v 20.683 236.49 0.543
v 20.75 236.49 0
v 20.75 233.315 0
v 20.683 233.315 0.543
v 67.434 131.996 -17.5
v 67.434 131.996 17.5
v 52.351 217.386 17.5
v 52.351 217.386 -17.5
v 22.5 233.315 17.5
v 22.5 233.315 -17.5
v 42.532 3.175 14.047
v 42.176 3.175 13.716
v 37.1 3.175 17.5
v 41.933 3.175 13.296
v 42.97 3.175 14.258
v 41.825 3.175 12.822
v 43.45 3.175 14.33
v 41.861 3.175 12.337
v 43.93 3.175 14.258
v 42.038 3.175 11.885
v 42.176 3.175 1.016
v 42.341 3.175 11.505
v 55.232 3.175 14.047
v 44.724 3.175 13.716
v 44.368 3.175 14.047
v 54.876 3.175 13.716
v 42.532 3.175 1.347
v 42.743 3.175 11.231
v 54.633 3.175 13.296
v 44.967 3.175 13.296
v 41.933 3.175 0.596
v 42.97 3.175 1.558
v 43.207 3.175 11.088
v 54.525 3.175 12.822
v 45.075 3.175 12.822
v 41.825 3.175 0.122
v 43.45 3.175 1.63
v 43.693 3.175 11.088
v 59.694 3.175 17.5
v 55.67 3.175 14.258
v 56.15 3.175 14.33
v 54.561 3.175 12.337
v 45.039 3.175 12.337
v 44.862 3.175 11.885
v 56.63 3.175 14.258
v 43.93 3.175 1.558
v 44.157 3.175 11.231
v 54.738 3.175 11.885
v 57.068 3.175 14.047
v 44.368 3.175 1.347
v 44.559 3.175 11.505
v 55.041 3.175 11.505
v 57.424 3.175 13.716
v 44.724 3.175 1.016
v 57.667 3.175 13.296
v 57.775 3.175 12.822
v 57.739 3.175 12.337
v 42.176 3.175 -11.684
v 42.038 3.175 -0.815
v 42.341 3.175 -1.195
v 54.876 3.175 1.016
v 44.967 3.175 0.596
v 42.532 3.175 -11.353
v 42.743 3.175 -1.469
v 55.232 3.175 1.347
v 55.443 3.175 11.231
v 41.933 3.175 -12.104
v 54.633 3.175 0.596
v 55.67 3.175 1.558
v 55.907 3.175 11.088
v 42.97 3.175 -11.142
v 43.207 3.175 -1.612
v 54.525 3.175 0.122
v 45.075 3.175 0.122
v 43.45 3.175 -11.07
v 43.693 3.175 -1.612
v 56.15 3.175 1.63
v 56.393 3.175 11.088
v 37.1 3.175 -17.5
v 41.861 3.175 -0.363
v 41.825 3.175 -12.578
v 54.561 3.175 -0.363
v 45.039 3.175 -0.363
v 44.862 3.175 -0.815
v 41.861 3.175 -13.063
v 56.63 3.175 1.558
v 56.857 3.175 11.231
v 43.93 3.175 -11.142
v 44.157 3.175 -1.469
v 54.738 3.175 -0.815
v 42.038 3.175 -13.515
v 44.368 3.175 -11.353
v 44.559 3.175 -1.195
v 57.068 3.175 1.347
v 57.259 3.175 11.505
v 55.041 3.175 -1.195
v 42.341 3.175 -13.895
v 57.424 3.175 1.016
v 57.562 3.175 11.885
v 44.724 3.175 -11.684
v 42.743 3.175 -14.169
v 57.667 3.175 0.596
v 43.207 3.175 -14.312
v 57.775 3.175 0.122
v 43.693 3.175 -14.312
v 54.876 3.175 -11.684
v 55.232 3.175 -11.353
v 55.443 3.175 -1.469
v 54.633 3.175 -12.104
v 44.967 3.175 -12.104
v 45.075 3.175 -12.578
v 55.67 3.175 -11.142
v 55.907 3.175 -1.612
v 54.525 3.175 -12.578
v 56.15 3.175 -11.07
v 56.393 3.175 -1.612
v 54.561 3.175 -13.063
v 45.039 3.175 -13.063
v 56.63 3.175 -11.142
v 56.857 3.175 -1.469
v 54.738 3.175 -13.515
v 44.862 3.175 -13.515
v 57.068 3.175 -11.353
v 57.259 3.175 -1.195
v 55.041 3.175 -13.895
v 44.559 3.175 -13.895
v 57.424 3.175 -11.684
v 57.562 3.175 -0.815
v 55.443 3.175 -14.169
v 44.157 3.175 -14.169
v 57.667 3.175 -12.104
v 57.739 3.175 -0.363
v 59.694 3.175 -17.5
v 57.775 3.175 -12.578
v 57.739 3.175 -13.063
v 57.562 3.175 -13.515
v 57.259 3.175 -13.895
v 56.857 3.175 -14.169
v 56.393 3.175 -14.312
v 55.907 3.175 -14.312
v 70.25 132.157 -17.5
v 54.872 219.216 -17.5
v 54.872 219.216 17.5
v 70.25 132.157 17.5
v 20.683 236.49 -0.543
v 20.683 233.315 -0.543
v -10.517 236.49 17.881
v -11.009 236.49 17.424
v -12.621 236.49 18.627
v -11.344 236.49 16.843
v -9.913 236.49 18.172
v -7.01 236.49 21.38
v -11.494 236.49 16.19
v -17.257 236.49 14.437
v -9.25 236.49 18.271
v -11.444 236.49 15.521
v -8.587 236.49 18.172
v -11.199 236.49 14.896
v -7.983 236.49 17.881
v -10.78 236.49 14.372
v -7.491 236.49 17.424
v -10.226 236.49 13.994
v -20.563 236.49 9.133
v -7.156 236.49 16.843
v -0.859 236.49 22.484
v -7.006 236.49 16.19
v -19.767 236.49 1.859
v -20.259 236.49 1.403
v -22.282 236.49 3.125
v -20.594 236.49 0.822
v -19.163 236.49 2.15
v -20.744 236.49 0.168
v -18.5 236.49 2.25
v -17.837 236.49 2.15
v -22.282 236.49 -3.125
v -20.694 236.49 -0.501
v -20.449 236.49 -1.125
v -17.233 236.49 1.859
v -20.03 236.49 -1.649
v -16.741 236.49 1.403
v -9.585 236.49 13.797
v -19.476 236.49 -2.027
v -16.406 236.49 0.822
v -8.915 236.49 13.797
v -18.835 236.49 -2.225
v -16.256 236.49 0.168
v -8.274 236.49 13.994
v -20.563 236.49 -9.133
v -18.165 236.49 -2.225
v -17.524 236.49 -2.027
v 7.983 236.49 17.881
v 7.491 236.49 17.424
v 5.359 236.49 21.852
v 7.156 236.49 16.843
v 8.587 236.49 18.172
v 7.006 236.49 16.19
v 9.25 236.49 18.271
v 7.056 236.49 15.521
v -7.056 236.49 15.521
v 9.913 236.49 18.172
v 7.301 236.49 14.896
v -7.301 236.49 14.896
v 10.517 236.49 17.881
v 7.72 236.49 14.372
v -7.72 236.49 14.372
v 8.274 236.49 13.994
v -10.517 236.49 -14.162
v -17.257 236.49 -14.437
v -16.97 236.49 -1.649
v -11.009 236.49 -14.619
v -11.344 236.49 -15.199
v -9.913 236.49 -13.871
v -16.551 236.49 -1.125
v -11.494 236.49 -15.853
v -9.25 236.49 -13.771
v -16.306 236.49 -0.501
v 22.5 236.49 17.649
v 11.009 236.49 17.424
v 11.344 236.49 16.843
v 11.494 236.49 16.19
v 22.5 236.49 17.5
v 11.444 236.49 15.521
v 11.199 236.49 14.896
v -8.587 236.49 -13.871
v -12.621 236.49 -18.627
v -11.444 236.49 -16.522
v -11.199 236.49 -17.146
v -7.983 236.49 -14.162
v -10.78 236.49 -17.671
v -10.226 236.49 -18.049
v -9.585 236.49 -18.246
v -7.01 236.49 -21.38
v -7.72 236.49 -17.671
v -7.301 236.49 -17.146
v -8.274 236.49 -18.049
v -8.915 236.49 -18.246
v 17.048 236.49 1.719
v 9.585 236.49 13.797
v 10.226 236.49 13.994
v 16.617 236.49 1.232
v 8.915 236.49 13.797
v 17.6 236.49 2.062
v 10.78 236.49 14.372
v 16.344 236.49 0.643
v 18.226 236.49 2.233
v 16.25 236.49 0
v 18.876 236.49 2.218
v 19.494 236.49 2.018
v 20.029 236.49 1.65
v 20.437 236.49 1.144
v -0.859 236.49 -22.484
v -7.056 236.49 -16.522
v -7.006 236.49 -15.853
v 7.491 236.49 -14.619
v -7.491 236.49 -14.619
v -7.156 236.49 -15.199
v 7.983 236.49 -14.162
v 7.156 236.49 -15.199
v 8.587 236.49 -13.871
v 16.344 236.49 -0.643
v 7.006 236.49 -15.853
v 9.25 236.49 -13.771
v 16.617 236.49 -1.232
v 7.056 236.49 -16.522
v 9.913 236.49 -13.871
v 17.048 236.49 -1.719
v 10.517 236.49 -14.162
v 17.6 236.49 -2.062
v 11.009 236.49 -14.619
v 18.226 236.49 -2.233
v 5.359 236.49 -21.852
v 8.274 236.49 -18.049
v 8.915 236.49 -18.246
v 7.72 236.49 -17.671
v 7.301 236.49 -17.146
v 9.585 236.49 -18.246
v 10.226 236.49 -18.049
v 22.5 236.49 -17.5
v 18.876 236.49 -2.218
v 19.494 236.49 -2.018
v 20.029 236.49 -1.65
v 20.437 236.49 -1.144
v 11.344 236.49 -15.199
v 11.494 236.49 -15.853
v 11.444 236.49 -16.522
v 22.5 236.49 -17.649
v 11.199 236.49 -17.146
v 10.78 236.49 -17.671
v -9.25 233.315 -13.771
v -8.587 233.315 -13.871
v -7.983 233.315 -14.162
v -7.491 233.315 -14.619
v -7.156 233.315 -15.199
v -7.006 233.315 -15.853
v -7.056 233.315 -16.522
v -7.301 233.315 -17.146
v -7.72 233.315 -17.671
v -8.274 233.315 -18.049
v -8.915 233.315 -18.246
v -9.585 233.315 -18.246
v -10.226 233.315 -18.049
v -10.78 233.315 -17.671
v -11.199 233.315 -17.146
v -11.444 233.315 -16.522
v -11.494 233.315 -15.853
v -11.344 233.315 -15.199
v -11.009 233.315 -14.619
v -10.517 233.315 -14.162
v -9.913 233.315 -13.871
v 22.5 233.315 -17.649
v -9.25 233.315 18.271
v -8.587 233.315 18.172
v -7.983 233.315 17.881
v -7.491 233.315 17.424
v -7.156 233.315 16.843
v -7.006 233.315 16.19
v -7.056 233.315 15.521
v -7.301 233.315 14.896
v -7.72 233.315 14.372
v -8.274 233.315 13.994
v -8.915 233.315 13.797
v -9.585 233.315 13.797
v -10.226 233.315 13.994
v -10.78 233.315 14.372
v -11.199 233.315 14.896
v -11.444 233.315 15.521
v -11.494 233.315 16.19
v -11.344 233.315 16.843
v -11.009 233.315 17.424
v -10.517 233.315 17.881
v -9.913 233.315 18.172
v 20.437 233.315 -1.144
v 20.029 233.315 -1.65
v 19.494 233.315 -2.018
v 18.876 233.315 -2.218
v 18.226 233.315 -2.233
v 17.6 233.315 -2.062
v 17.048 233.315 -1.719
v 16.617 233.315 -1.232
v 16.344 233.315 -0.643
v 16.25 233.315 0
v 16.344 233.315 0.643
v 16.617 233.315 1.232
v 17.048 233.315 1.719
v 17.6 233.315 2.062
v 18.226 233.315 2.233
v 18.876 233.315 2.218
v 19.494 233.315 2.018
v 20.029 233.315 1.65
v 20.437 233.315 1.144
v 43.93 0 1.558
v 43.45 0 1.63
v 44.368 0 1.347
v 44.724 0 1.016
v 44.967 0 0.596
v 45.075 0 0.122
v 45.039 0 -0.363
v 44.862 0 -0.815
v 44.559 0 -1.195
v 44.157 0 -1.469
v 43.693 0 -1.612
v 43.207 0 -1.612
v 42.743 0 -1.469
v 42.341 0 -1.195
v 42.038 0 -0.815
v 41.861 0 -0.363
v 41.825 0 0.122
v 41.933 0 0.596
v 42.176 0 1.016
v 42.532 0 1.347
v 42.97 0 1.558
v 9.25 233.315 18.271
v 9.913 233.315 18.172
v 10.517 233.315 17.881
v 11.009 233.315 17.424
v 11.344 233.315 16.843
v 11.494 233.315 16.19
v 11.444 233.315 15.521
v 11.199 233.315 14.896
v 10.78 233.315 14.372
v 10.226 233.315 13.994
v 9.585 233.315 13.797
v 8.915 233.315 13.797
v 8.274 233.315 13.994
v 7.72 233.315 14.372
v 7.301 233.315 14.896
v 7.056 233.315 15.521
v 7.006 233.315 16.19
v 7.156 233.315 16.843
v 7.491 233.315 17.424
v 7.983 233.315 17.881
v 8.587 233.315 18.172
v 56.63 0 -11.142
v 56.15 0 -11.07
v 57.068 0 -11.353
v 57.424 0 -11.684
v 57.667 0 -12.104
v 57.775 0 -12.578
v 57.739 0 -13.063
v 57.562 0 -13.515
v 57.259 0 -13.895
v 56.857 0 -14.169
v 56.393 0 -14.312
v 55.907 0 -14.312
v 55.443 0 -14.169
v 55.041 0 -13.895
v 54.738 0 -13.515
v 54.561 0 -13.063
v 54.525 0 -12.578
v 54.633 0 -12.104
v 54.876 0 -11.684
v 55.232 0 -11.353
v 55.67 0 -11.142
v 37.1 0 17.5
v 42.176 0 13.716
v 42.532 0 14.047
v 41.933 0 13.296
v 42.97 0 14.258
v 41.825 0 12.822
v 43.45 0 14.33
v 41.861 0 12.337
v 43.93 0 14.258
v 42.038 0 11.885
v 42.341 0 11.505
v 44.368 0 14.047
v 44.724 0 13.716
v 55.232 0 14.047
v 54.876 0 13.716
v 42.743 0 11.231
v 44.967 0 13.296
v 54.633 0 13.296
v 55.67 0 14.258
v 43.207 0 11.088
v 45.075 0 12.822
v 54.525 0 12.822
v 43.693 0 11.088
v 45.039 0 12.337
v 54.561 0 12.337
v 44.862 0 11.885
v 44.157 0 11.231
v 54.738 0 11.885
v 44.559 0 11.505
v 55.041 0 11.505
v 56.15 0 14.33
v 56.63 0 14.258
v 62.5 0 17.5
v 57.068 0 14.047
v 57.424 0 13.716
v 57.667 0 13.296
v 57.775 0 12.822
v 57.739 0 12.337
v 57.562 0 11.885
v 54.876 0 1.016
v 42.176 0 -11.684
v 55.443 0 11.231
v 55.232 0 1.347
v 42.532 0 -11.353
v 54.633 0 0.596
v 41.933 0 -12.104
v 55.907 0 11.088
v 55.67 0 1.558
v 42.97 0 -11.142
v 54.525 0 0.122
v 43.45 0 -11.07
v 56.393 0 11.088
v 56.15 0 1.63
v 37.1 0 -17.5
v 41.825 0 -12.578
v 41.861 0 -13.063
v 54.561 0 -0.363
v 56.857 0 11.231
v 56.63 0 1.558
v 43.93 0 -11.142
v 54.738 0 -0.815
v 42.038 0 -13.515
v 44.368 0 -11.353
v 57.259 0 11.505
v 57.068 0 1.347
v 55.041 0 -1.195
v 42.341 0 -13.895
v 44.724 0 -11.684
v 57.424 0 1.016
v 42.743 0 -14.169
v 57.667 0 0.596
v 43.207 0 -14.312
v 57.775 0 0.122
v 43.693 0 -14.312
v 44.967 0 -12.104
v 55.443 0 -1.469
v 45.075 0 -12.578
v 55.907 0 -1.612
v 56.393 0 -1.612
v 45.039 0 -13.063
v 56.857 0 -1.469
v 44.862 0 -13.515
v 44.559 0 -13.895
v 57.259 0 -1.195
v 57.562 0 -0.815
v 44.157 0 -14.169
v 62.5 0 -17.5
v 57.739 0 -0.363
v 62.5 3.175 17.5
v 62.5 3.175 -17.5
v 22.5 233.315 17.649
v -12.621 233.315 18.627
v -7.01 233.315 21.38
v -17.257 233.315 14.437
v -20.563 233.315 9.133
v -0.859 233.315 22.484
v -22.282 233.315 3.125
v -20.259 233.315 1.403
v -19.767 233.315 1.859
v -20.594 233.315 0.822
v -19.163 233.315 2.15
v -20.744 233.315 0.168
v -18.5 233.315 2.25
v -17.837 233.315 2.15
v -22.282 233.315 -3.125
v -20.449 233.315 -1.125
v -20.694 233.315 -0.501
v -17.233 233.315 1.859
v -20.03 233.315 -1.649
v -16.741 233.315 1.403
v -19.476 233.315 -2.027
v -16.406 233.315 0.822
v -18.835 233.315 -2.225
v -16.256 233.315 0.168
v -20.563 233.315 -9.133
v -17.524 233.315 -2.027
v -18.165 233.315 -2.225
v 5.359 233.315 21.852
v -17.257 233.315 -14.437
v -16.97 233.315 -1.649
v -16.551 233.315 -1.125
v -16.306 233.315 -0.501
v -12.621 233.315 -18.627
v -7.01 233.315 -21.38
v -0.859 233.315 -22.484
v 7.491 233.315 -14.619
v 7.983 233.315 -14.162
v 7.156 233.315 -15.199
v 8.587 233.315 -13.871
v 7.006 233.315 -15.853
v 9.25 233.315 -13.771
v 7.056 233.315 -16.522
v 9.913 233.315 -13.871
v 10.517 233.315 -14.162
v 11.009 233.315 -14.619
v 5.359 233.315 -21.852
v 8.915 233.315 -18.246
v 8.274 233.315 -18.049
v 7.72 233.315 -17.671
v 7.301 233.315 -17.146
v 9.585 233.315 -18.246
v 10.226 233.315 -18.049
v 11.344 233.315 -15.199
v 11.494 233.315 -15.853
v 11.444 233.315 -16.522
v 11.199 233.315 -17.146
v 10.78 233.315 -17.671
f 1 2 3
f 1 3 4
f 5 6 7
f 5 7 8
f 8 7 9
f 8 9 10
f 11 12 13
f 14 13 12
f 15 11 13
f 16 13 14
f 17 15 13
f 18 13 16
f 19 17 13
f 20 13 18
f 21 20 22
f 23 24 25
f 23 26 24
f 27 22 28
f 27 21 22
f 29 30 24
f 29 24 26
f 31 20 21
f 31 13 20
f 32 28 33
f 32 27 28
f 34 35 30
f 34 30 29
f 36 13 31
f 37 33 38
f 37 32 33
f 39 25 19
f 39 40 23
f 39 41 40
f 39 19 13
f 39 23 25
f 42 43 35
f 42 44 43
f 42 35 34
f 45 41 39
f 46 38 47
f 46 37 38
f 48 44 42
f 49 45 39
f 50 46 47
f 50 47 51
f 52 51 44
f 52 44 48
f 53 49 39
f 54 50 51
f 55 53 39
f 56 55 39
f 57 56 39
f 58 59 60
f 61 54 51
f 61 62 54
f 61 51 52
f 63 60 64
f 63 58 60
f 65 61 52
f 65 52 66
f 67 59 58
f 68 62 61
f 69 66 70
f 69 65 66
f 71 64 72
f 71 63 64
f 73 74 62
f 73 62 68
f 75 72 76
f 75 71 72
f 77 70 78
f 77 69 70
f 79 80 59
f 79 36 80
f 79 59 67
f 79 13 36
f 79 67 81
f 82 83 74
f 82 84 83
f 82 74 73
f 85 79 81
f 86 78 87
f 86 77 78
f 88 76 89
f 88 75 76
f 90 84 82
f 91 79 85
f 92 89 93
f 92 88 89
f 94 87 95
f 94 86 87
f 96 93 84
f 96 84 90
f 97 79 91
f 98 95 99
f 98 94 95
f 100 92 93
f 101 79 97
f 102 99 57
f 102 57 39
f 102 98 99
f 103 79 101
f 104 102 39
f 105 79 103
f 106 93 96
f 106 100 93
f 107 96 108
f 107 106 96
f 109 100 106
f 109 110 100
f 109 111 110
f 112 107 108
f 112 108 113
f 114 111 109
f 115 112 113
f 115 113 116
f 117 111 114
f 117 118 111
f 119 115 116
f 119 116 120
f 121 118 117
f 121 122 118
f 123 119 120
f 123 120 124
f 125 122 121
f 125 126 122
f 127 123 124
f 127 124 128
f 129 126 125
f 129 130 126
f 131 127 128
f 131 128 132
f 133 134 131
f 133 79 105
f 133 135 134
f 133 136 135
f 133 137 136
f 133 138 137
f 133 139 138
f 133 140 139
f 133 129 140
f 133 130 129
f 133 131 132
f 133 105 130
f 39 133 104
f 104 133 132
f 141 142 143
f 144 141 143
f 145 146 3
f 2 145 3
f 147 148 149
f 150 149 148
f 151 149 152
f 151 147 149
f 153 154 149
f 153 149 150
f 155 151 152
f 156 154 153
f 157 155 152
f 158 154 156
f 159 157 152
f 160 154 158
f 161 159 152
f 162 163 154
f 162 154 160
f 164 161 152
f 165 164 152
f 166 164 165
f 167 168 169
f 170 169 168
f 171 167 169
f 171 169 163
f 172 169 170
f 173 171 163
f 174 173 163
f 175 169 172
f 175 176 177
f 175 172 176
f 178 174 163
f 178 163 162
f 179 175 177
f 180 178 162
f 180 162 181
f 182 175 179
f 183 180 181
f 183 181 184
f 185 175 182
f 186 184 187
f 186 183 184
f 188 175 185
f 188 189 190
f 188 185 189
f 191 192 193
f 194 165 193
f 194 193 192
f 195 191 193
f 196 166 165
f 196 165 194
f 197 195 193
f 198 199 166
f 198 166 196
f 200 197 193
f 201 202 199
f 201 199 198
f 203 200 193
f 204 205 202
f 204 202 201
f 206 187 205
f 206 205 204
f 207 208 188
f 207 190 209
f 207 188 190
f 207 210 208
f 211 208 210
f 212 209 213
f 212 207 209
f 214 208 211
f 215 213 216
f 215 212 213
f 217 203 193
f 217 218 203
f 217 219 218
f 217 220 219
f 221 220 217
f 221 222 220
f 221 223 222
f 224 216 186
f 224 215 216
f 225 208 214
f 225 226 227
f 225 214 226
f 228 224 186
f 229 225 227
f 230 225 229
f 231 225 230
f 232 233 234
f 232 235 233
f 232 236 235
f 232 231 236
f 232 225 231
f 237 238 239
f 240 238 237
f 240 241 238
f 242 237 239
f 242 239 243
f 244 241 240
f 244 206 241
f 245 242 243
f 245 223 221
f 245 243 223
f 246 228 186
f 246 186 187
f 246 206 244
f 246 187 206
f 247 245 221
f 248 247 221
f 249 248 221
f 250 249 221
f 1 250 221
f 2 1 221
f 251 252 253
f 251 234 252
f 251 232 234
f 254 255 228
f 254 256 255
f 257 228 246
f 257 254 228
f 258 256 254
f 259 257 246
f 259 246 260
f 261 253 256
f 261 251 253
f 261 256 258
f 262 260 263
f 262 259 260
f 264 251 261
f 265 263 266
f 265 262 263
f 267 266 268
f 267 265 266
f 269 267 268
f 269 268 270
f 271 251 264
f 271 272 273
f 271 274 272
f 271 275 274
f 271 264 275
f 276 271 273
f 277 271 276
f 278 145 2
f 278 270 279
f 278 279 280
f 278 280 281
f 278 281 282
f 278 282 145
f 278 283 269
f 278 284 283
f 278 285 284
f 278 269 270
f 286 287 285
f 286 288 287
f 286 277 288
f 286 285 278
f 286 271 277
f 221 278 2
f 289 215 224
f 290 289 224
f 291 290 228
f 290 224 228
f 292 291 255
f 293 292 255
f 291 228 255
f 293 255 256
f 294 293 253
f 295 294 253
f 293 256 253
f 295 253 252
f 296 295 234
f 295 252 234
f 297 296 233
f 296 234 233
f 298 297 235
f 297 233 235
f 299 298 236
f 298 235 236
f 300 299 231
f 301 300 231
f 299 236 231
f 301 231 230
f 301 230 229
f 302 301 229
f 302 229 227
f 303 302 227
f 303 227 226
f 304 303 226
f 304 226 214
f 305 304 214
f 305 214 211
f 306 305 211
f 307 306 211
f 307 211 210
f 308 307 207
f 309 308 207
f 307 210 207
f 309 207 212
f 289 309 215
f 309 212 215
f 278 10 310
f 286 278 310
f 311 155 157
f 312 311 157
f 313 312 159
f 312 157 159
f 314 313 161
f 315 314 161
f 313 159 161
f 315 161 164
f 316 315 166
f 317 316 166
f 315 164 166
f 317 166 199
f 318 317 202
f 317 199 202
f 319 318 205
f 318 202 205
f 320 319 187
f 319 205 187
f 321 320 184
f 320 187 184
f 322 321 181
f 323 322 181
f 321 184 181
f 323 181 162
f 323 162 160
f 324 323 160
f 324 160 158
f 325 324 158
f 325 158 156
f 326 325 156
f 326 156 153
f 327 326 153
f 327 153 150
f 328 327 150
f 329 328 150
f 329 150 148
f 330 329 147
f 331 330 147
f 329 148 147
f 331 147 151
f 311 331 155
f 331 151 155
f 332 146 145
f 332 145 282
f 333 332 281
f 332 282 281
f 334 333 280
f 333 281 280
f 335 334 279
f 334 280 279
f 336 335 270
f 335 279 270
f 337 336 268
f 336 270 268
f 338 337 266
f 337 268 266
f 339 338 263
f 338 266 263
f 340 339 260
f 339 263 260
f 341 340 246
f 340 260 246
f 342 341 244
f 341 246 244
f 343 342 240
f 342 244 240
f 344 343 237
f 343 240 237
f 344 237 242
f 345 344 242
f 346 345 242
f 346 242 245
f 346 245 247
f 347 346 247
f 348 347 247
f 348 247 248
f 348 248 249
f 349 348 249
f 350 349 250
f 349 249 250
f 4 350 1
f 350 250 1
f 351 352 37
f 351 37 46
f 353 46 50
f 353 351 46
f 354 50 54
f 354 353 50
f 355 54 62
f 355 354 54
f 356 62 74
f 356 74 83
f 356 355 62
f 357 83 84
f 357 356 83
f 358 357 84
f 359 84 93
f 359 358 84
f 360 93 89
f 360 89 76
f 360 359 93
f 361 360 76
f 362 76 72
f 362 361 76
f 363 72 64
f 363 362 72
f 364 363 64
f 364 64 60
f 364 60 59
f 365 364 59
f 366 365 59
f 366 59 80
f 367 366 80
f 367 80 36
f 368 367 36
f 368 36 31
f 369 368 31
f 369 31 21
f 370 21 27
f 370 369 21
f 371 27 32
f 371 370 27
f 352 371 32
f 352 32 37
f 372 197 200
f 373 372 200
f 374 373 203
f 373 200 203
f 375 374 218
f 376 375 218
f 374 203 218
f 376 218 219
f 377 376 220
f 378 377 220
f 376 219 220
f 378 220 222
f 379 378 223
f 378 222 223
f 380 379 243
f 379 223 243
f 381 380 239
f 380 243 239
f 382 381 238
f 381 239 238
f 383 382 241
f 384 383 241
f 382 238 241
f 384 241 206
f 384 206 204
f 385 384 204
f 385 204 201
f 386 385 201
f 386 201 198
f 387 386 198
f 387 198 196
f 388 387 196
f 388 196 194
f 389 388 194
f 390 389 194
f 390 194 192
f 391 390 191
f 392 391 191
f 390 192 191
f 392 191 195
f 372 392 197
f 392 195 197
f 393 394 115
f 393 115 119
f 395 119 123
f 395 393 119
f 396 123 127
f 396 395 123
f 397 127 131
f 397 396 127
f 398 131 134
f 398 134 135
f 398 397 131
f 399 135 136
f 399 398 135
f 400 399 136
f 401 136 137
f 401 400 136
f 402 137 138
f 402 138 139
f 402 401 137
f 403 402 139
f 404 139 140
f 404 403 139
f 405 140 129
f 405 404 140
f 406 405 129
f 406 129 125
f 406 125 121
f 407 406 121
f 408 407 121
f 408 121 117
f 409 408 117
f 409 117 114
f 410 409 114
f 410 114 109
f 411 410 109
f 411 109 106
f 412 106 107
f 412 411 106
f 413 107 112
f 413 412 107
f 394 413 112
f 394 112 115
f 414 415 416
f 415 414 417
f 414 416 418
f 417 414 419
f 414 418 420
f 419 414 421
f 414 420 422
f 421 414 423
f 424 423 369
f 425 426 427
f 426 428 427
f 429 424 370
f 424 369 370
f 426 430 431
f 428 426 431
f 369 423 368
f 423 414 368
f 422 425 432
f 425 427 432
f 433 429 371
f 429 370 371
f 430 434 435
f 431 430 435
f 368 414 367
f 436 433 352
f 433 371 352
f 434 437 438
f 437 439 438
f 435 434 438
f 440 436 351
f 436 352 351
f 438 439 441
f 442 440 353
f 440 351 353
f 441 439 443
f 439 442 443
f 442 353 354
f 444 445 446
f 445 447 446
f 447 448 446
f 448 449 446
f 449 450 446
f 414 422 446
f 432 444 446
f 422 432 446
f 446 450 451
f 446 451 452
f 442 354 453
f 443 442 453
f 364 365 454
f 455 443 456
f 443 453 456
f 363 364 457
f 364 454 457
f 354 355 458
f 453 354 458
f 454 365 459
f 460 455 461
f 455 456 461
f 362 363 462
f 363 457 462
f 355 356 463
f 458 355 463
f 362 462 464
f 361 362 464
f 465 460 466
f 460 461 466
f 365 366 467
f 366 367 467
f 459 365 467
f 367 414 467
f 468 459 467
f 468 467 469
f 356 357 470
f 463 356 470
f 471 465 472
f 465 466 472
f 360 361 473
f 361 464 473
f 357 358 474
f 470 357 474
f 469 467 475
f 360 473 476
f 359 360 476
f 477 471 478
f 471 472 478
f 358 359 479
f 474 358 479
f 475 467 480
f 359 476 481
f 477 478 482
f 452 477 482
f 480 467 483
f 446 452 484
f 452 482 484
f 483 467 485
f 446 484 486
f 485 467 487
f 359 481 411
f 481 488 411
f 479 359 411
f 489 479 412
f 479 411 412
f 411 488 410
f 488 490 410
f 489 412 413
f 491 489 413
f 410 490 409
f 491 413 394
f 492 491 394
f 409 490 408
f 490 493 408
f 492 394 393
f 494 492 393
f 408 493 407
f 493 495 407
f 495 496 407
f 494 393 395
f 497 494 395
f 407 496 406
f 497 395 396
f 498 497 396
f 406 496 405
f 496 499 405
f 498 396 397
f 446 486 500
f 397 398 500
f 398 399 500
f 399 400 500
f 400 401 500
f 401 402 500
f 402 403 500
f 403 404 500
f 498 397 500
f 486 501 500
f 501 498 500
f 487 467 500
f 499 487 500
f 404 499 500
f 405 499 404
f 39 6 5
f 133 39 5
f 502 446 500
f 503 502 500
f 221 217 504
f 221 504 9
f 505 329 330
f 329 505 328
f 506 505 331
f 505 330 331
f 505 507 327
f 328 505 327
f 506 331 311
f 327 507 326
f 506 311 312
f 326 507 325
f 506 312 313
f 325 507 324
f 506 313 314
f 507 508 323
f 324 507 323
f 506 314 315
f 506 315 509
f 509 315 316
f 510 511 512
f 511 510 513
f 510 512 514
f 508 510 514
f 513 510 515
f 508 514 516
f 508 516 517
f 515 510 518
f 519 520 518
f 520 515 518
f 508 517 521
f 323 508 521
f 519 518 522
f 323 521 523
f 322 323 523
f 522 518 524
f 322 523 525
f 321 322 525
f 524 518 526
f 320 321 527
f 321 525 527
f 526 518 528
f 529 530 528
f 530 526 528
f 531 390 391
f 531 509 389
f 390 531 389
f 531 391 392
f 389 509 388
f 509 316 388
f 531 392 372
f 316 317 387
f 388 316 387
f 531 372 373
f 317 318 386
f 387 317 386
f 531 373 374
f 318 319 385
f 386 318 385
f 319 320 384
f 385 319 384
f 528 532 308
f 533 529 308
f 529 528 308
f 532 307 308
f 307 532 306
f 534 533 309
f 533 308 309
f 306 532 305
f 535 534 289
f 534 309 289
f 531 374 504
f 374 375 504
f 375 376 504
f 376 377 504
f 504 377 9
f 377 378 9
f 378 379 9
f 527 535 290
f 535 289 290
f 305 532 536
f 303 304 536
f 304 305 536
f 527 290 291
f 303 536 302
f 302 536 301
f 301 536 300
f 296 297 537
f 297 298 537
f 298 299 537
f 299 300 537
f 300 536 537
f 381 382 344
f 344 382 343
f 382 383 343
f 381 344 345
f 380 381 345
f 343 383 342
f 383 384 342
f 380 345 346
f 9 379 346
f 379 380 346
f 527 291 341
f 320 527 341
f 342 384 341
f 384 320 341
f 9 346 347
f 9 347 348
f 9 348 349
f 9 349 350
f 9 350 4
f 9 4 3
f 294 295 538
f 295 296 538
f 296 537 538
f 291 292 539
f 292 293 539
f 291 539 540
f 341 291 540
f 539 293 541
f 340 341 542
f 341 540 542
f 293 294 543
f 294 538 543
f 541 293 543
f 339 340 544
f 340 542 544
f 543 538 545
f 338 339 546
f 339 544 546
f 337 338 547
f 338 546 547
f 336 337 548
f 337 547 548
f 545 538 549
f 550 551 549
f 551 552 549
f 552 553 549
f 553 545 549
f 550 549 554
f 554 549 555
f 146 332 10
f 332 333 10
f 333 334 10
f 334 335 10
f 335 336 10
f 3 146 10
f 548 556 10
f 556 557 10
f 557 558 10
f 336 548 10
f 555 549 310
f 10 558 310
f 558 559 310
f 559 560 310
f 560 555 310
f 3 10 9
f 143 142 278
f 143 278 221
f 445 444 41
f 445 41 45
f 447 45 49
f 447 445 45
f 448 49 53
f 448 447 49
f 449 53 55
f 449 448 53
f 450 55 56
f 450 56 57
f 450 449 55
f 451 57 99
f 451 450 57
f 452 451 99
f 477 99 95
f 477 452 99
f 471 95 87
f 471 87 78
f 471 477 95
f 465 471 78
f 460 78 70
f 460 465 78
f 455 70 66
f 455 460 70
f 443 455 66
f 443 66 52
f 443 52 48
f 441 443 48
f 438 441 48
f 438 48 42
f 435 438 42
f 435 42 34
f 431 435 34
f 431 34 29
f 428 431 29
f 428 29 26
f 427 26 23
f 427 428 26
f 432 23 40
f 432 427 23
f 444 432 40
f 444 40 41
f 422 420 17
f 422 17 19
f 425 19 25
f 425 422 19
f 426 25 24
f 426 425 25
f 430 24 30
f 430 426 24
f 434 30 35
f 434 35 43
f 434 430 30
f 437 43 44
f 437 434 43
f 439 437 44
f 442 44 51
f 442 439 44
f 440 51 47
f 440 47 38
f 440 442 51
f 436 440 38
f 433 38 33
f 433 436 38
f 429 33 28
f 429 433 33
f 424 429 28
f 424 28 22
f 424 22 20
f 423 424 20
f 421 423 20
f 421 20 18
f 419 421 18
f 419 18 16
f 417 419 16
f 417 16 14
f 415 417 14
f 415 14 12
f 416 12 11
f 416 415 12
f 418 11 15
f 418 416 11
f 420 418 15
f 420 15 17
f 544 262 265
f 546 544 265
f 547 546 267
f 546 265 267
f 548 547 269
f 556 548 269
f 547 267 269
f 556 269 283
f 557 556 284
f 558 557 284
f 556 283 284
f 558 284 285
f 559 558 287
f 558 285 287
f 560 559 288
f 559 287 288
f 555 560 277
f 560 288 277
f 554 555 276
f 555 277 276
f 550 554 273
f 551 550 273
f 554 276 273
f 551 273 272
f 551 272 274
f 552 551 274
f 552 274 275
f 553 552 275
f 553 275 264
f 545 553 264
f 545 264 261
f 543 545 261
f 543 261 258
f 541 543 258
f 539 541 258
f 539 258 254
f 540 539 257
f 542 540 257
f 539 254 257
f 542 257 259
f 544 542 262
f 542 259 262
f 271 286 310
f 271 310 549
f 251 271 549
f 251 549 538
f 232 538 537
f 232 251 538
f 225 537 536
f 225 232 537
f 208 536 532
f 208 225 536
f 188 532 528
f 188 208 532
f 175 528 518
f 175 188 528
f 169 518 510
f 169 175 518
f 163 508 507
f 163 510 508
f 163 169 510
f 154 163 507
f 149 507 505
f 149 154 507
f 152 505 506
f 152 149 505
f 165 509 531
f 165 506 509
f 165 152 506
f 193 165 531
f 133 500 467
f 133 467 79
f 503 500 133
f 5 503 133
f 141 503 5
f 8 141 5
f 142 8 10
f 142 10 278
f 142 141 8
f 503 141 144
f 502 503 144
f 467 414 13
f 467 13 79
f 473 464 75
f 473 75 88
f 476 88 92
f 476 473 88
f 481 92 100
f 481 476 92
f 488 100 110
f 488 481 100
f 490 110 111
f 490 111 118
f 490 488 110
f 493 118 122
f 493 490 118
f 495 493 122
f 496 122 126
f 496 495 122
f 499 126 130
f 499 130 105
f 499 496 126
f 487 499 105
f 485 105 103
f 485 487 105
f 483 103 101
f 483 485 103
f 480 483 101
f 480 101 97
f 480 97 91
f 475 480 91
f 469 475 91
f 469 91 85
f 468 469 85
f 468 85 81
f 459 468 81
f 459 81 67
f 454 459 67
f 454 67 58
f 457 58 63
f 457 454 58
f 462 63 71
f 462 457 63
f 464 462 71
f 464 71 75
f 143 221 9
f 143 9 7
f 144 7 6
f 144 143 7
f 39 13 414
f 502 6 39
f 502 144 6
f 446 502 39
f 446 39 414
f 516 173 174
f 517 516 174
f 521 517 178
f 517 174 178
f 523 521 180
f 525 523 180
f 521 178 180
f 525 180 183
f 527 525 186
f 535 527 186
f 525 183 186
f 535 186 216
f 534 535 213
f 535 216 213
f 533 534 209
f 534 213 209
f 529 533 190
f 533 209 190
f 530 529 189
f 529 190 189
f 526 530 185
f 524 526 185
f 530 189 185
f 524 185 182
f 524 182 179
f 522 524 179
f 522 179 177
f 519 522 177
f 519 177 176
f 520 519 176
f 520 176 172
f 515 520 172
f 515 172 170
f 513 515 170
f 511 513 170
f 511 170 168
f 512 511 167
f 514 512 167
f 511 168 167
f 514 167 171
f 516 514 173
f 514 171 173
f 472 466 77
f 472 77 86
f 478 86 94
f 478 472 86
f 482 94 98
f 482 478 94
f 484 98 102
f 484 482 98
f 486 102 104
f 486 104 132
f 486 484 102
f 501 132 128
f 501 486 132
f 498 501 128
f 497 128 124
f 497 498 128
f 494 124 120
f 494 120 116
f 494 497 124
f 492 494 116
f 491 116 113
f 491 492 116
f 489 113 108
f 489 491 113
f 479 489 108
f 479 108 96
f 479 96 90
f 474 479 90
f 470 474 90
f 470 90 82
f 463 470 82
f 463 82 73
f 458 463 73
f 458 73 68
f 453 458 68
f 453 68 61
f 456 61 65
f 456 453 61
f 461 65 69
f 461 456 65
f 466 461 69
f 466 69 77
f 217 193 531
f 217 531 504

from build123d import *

# Parameters (mm, degrees)
SKETCH2_R               = 22.5
SKETCH2_R_2             = 2.25
BOSS_EXTRUDE1_DEPTH     = 3.175
SKETCH1_W               = 25.4
SKETCH1_H               = 35
SKETCH1_R               = 1.63
BOSS_EXTRUDE2_DEPTH     = 3.175
BOSS_EXTRUDE6_DEPTH     = 3.175
TOP_CONNECTION_SKETCH_W = 35
TOP_CONNECTION_SKETCH_H = 3.175


with BuildPart() as part:
    # Sketch2 → Boss-Extrude1 (new body)
    with BuildSketch(Plane(origin=(0, 236.49, 0), x_dir=(1, 0, 0), z_dir=(0, 1, 0))):
        with Locations(Location((0, 0, 0), (0, 0, 270))):
            Circle(SKETCH2_R)
        with Locations(Location((9.25, 16.02146997, 0), (0, 0, 270))):
            Circle(SKETCH2_R_2, mode=Mode.SUBTRACT)
        with Locations(Location((18.5, 0, 0), (0, 0, 270))):
            Circle(SKETCH2_R_2, mode=Mode.SUBTRACT)
        with Locations(Location((9.25, -16.02146997, 0), (0, 0, 270))):
            Circle(SKETCH2_R_2, mode=Mode.SUBTRACT)
        with Locations(Location((-9.25, -16.02146997, 0), (0, 0, 270))):
            Circle(SKETCH2_R_2, mode=Mode.SUBTRACT)
        with Locations(Location((-18.5, 0, 0), (0, 0, 270))):
            Circle(SKETCH2_R_2, mode=Mode.SUBTRACT)
        with Locations(Location((-9.25, 16.02146997, 0), (0, 0, 270))):
            Circle(SKETCH2_R_2, mode=Mode.SUBTRACT)
    extrude(amount=-BOSS_EXTRUDE1_DEPTH)

    # Sketch8 → Boss-Extrude6 (add)
    with BuildSketch(Plane(origin=(0, 236.49, 0), x_dir=(1, 0, 0), z_dir=(0, 1, 0))):
        Polygon((22.5, -17.648859957), (22.5, 0), (20.75, 0), (19.341522111, -11.495891545), (5.359057513, -21.852471315), align=None)
        Polygon((22.5, 0), (22.5, 17.648859957), (5.359057513, 21.852471315), (19.341522111, 11.495891545), (20.75, 0), align=None)
    extrude(amount=-BOSS_EXTRUDE6_DEPTH)



with BuildPart() as body_2:
    # Sketch1 → Boss-Extrude2 (new body)
    with BuildSketch(Plane(origin=(0, 0, 0), x_dir=(1, 0, 0), z_dir=(0, 1, 0))):
        with Locations((49.8, 0)):
            Rectangle(SKETCH1_W, SKETCH1_H)
        with Locations(Location((43.45, 0, 0), (0, 0, 270))):
            Circle(SKETCH1_R, mode=Mode.SUBTRACT)
        with Locations(Location((56.15, 0, 0), (0, 0, 270))):
            Circle(SKETCH1_R, mode=Mode.SUBTRACT)
        with Locations(Location((43.45, 12.7, 0), (0, 0, 270))):
            Circle(SKETCH1_R, mode=Mode.SUBTRACT)
        with Locations(Location((56.15, 12.7, 0), (0, 0, 270))):
            Circle(SKETCH1_R, mode=Mode.SUBTRACT)
        with Locations(Location((43.45, -12.7, 0), (0, 0, 270))):
            Circle(SKETCH1_R, mode=Mode.SUBTRACT)
        with Locations(Location((56.15, -12.7, 0), (0, 0, 270))):
            Circle(SKETCH1_R, mode=Mode.SUBTRACT)
    extrude(amount=BOSS_EXTRUDE2_DEPTH)


with BuildPart() as part_1:
    add(part.part)

    add(body_2.part)  # Sweep1 merges body 2
    # Sweep1: sweep along a curve in space
    with BuildLine() as sweep1_path:
        Line((22.5, 236.49, 0), (54.871837923, 219.215989902, 0))
        Line((70.25, 132.157447282, 0), (54.871837923, 219.215989902, 0))
        Line((62.5, 3.175, 0), (70.25, 132.157447282, 0))
    # Top_Connection_Sketch → Sweep1 (sweep)
    with BuildSketch(Plane(origin=(22.5, 0, 0), x_dir=(0, 0, -1), z_dir=(1, 0, 0))):
        with Locations((0, 234.9025)):
            Rectangle(TOP_CONNECTION_SKETCH_W, TOP_CONNECTION_SKETCH_H)
    sweep(path=sweep1_path.line, transition=Transition.RIGHT)


solid = part_1.part
